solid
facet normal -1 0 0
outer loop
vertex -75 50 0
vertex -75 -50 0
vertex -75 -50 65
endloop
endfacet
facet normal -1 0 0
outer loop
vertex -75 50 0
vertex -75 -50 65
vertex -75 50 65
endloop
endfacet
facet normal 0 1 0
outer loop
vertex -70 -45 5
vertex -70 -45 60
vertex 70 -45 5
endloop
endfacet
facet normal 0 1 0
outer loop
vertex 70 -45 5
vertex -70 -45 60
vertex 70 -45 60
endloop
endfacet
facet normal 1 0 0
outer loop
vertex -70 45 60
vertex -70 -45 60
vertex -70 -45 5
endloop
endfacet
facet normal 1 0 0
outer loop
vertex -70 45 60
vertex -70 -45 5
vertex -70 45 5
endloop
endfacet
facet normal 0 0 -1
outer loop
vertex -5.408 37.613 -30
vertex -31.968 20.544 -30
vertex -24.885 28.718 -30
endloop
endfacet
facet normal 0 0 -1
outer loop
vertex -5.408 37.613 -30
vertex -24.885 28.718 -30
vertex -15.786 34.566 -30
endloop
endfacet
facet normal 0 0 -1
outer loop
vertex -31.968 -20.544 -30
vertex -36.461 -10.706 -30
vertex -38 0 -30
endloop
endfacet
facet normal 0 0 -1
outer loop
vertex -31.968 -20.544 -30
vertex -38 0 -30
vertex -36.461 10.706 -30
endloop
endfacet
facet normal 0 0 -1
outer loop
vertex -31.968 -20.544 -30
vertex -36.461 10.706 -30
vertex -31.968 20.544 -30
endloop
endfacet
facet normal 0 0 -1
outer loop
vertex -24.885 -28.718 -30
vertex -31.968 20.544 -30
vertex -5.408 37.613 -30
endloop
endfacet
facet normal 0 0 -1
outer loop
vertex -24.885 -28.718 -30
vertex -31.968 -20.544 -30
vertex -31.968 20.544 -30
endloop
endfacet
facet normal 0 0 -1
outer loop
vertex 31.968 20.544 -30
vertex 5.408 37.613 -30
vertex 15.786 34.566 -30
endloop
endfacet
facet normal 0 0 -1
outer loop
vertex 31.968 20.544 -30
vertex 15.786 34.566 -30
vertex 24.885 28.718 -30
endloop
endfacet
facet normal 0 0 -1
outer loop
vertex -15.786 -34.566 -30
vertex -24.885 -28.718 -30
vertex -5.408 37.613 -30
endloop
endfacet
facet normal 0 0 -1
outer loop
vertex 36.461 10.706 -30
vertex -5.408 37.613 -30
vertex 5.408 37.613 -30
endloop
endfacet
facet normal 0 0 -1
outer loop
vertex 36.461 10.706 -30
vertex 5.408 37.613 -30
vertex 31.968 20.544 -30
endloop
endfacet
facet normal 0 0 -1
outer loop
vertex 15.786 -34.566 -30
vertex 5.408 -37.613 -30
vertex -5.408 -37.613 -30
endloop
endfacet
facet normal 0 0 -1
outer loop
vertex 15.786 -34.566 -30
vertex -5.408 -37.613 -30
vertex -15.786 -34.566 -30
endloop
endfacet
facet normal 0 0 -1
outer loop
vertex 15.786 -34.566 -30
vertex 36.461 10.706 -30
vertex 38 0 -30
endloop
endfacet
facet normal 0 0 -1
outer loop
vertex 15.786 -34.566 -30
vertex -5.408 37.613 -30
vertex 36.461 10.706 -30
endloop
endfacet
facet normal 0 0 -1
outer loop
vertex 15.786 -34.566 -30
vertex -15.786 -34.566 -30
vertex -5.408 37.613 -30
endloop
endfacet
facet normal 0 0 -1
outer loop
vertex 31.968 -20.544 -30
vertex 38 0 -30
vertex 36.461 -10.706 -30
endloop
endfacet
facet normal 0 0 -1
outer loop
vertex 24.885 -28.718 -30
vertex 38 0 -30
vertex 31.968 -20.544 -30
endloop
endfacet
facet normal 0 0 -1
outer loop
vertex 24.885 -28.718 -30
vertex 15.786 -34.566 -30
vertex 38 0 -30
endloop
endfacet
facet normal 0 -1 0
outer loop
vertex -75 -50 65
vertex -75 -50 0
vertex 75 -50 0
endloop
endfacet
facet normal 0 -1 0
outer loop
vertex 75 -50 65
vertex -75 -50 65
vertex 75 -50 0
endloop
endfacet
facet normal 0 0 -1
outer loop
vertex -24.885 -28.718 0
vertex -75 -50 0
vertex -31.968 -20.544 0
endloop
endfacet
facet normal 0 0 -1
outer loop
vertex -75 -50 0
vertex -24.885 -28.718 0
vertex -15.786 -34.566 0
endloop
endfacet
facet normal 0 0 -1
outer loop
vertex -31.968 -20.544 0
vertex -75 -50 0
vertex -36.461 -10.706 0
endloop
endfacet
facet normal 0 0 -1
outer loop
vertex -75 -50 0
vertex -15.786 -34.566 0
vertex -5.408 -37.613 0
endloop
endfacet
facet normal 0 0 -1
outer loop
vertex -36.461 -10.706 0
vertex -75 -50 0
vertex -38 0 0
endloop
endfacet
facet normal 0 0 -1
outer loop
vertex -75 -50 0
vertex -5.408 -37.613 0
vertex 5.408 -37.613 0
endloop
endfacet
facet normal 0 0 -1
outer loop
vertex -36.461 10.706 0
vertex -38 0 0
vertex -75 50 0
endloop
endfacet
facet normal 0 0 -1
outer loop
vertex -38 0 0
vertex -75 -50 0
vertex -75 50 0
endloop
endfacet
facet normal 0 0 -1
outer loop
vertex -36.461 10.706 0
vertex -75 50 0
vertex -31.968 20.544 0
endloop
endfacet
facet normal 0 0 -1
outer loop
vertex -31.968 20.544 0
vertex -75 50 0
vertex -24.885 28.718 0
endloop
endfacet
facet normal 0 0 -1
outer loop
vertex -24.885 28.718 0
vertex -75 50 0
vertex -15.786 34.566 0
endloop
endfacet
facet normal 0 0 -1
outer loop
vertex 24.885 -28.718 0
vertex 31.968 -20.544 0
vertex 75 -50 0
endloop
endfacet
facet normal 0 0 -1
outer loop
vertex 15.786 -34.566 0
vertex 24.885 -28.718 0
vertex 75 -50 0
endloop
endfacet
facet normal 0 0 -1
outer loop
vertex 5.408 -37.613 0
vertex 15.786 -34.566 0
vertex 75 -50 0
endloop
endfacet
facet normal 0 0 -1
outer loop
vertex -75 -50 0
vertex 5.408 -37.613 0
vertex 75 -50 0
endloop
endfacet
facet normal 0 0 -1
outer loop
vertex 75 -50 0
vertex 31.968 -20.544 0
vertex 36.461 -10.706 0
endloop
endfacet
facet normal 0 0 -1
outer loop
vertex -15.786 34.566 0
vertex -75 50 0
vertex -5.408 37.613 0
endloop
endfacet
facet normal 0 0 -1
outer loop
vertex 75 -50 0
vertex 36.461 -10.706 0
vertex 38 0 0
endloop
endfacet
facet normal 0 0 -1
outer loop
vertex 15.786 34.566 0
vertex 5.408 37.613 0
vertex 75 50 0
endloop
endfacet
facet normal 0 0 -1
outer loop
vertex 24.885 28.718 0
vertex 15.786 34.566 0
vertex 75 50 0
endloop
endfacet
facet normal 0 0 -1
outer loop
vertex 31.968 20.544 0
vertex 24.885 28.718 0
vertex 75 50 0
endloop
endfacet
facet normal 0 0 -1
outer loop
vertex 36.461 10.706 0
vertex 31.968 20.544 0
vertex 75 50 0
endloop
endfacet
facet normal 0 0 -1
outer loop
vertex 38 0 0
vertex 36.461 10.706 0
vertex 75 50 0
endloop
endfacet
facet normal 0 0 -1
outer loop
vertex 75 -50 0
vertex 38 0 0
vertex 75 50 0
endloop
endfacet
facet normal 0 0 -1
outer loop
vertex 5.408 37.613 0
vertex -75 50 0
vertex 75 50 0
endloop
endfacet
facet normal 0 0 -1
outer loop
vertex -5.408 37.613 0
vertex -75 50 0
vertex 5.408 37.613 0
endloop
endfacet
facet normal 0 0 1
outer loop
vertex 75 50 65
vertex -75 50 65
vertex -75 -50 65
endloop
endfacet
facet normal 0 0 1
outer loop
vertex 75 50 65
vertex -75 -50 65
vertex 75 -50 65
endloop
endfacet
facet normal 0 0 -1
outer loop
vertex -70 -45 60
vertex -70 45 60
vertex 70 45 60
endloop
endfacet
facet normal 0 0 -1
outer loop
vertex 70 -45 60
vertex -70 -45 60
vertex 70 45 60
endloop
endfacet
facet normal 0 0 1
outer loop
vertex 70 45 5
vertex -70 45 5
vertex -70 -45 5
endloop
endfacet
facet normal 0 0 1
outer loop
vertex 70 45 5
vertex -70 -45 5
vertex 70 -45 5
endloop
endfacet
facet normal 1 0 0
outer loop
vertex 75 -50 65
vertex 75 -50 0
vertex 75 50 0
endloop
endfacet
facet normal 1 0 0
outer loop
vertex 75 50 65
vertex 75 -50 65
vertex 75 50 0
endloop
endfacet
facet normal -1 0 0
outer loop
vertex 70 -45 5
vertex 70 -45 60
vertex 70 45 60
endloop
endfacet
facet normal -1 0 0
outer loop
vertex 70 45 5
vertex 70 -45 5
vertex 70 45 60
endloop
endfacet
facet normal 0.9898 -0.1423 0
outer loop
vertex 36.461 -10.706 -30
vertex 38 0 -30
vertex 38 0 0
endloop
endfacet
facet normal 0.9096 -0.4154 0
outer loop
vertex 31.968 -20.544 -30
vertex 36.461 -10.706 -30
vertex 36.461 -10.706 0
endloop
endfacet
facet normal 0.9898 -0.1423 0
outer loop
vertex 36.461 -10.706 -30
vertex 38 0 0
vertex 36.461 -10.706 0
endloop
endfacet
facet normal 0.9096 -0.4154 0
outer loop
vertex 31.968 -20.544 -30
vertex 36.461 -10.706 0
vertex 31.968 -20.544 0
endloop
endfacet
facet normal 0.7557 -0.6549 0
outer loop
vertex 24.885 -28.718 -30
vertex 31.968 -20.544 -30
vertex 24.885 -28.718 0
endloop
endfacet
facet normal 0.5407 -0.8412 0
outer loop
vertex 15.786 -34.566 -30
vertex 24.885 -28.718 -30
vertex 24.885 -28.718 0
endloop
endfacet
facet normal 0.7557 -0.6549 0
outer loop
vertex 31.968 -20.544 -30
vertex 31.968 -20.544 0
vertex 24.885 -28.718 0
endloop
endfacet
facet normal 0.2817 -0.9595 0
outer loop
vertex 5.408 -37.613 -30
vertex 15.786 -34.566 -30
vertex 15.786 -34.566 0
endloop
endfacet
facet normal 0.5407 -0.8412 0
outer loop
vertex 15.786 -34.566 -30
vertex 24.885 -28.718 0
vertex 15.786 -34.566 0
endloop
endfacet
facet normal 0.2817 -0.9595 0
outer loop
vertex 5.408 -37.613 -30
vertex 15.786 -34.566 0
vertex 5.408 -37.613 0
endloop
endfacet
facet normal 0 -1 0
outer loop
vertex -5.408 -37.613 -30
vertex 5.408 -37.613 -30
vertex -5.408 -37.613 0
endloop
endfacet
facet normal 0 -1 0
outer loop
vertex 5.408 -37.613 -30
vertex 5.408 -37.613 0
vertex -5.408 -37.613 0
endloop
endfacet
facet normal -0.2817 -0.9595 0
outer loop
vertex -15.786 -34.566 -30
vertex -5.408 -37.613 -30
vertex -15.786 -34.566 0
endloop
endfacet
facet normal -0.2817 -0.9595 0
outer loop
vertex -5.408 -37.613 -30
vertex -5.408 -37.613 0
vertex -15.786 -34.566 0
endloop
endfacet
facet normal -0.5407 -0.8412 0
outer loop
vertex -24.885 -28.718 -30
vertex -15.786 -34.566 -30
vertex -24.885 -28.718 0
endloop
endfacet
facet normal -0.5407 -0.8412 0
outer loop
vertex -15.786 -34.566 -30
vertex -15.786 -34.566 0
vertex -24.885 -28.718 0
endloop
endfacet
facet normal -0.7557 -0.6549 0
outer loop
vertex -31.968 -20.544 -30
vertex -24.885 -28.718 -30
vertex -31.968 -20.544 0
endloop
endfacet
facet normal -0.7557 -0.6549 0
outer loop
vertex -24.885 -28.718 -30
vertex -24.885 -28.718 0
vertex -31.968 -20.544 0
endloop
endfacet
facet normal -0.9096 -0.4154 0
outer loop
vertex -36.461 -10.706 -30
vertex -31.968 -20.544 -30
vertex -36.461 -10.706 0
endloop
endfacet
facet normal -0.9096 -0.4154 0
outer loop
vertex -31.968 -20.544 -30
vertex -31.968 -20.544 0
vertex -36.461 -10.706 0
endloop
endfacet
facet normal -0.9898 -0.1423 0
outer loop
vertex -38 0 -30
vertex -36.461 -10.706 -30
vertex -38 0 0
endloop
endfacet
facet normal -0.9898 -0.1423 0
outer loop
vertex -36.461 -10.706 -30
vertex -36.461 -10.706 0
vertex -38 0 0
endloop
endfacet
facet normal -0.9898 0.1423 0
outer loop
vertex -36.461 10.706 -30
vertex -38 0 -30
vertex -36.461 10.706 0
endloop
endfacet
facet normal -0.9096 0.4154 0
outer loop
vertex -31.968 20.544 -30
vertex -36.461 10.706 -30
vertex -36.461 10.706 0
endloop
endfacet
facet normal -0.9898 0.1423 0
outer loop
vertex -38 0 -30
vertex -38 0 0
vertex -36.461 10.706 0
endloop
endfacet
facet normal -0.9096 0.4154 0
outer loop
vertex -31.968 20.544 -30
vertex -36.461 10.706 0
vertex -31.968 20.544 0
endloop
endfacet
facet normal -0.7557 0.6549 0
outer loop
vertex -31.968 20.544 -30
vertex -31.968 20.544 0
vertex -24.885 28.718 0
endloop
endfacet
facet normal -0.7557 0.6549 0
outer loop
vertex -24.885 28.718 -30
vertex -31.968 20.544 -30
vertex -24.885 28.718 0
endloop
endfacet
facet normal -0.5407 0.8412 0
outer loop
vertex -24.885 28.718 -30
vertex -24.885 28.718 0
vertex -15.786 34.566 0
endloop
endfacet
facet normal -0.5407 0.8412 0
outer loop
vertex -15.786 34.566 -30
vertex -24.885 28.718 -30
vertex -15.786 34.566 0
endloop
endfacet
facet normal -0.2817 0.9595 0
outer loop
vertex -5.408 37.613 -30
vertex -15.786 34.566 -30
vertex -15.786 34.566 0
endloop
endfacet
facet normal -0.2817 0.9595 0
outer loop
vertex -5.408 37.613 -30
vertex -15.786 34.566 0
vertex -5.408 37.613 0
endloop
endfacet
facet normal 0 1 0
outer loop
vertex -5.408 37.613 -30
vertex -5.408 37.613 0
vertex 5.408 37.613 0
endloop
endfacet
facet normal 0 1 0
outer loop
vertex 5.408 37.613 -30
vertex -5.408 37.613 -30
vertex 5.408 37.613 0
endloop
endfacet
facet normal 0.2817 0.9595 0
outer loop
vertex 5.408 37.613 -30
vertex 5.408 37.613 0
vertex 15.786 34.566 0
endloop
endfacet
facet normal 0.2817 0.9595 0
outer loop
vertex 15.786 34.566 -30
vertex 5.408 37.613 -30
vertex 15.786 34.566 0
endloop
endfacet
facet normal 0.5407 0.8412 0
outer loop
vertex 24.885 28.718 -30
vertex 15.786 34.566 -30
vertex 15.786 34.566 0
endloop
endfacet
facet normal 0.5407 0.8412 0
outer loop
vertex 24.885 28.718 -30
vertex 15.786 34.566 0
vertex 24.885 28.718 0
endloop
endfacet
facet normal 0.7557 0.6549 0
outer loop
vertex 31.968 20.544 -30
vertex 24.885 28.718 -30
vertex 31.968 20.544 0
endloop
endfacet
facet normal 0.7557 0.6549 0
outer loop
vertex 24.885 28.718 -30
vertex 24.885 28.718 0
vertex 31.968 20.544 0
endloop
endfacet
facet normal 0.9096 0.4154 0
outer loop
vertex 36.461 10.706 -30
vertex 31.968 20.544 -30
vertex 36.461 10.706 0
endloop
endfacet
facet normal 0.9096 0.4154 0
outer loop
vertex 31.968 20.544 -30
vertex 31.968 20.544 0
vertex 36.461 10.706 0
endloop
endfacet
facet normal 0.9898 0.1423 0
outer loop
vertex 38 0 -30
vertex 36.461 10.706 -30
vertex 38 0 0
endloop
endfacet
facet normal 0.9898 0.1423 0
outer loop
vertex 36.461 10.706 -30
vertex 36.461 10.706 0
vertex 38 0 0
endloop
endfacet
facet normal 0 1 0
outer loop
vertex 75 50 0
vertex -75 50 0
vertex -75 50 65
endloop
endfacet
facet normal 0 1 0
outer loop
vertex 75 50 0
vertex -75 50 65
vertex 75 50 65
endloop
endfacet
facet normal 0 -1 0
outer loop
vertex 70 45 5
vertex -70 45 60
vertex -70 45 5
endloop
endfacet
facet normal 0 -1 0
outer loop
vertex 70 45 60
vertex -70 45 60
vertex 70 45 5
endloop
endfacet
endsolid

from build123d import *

# Parameters (mm, degrees)
SKETCH_1_W          = 150
SKETCH_1_H          = 100
EXTRUDE_1_DEPTH     = 65
SKETCH_4_W          = 140
SKETCH_4_H          = 90
CUT_EXTRUDE_1_DEPTH = 55
SKETCH_5_R          = 38
EXTRUDE_2_DEPTH     = 30


with BuildPart() as part:
    # 草图1 → 凸台-拉伸1 (new body)
    with BuildSketch(Plane.XY):
        Rectangle(SKETCH_1_W, SKETCH_1_H)
    extrude(amount=EXTRUDE_1_DEPTH)

    # 草图4 → 切除-拉伸1 (cut)
    with BuildSketch(Plane.XY.offset(60)):
        Rectangle(SKETCH_4_W, SKETCH_4_H)
    extrude(amount=-CUT_EXTRUDE_1_DEPTH, mode=Mode.SUBTRACT)

    # 草图5 → 凸台-拉伸2 (add)
    with BuildSketch(Plane(origin=(0, 0, 0), x_dir=(-1, 0, 0), z_dir=(0, 0, -1))):
        with Locations(Location((0, 0, 0), (0, 0, 180))):
            Circle(SKETCH_5_R)
    extrude(amount=EXTRUDE_2_DEPTH)


solid = part.part
